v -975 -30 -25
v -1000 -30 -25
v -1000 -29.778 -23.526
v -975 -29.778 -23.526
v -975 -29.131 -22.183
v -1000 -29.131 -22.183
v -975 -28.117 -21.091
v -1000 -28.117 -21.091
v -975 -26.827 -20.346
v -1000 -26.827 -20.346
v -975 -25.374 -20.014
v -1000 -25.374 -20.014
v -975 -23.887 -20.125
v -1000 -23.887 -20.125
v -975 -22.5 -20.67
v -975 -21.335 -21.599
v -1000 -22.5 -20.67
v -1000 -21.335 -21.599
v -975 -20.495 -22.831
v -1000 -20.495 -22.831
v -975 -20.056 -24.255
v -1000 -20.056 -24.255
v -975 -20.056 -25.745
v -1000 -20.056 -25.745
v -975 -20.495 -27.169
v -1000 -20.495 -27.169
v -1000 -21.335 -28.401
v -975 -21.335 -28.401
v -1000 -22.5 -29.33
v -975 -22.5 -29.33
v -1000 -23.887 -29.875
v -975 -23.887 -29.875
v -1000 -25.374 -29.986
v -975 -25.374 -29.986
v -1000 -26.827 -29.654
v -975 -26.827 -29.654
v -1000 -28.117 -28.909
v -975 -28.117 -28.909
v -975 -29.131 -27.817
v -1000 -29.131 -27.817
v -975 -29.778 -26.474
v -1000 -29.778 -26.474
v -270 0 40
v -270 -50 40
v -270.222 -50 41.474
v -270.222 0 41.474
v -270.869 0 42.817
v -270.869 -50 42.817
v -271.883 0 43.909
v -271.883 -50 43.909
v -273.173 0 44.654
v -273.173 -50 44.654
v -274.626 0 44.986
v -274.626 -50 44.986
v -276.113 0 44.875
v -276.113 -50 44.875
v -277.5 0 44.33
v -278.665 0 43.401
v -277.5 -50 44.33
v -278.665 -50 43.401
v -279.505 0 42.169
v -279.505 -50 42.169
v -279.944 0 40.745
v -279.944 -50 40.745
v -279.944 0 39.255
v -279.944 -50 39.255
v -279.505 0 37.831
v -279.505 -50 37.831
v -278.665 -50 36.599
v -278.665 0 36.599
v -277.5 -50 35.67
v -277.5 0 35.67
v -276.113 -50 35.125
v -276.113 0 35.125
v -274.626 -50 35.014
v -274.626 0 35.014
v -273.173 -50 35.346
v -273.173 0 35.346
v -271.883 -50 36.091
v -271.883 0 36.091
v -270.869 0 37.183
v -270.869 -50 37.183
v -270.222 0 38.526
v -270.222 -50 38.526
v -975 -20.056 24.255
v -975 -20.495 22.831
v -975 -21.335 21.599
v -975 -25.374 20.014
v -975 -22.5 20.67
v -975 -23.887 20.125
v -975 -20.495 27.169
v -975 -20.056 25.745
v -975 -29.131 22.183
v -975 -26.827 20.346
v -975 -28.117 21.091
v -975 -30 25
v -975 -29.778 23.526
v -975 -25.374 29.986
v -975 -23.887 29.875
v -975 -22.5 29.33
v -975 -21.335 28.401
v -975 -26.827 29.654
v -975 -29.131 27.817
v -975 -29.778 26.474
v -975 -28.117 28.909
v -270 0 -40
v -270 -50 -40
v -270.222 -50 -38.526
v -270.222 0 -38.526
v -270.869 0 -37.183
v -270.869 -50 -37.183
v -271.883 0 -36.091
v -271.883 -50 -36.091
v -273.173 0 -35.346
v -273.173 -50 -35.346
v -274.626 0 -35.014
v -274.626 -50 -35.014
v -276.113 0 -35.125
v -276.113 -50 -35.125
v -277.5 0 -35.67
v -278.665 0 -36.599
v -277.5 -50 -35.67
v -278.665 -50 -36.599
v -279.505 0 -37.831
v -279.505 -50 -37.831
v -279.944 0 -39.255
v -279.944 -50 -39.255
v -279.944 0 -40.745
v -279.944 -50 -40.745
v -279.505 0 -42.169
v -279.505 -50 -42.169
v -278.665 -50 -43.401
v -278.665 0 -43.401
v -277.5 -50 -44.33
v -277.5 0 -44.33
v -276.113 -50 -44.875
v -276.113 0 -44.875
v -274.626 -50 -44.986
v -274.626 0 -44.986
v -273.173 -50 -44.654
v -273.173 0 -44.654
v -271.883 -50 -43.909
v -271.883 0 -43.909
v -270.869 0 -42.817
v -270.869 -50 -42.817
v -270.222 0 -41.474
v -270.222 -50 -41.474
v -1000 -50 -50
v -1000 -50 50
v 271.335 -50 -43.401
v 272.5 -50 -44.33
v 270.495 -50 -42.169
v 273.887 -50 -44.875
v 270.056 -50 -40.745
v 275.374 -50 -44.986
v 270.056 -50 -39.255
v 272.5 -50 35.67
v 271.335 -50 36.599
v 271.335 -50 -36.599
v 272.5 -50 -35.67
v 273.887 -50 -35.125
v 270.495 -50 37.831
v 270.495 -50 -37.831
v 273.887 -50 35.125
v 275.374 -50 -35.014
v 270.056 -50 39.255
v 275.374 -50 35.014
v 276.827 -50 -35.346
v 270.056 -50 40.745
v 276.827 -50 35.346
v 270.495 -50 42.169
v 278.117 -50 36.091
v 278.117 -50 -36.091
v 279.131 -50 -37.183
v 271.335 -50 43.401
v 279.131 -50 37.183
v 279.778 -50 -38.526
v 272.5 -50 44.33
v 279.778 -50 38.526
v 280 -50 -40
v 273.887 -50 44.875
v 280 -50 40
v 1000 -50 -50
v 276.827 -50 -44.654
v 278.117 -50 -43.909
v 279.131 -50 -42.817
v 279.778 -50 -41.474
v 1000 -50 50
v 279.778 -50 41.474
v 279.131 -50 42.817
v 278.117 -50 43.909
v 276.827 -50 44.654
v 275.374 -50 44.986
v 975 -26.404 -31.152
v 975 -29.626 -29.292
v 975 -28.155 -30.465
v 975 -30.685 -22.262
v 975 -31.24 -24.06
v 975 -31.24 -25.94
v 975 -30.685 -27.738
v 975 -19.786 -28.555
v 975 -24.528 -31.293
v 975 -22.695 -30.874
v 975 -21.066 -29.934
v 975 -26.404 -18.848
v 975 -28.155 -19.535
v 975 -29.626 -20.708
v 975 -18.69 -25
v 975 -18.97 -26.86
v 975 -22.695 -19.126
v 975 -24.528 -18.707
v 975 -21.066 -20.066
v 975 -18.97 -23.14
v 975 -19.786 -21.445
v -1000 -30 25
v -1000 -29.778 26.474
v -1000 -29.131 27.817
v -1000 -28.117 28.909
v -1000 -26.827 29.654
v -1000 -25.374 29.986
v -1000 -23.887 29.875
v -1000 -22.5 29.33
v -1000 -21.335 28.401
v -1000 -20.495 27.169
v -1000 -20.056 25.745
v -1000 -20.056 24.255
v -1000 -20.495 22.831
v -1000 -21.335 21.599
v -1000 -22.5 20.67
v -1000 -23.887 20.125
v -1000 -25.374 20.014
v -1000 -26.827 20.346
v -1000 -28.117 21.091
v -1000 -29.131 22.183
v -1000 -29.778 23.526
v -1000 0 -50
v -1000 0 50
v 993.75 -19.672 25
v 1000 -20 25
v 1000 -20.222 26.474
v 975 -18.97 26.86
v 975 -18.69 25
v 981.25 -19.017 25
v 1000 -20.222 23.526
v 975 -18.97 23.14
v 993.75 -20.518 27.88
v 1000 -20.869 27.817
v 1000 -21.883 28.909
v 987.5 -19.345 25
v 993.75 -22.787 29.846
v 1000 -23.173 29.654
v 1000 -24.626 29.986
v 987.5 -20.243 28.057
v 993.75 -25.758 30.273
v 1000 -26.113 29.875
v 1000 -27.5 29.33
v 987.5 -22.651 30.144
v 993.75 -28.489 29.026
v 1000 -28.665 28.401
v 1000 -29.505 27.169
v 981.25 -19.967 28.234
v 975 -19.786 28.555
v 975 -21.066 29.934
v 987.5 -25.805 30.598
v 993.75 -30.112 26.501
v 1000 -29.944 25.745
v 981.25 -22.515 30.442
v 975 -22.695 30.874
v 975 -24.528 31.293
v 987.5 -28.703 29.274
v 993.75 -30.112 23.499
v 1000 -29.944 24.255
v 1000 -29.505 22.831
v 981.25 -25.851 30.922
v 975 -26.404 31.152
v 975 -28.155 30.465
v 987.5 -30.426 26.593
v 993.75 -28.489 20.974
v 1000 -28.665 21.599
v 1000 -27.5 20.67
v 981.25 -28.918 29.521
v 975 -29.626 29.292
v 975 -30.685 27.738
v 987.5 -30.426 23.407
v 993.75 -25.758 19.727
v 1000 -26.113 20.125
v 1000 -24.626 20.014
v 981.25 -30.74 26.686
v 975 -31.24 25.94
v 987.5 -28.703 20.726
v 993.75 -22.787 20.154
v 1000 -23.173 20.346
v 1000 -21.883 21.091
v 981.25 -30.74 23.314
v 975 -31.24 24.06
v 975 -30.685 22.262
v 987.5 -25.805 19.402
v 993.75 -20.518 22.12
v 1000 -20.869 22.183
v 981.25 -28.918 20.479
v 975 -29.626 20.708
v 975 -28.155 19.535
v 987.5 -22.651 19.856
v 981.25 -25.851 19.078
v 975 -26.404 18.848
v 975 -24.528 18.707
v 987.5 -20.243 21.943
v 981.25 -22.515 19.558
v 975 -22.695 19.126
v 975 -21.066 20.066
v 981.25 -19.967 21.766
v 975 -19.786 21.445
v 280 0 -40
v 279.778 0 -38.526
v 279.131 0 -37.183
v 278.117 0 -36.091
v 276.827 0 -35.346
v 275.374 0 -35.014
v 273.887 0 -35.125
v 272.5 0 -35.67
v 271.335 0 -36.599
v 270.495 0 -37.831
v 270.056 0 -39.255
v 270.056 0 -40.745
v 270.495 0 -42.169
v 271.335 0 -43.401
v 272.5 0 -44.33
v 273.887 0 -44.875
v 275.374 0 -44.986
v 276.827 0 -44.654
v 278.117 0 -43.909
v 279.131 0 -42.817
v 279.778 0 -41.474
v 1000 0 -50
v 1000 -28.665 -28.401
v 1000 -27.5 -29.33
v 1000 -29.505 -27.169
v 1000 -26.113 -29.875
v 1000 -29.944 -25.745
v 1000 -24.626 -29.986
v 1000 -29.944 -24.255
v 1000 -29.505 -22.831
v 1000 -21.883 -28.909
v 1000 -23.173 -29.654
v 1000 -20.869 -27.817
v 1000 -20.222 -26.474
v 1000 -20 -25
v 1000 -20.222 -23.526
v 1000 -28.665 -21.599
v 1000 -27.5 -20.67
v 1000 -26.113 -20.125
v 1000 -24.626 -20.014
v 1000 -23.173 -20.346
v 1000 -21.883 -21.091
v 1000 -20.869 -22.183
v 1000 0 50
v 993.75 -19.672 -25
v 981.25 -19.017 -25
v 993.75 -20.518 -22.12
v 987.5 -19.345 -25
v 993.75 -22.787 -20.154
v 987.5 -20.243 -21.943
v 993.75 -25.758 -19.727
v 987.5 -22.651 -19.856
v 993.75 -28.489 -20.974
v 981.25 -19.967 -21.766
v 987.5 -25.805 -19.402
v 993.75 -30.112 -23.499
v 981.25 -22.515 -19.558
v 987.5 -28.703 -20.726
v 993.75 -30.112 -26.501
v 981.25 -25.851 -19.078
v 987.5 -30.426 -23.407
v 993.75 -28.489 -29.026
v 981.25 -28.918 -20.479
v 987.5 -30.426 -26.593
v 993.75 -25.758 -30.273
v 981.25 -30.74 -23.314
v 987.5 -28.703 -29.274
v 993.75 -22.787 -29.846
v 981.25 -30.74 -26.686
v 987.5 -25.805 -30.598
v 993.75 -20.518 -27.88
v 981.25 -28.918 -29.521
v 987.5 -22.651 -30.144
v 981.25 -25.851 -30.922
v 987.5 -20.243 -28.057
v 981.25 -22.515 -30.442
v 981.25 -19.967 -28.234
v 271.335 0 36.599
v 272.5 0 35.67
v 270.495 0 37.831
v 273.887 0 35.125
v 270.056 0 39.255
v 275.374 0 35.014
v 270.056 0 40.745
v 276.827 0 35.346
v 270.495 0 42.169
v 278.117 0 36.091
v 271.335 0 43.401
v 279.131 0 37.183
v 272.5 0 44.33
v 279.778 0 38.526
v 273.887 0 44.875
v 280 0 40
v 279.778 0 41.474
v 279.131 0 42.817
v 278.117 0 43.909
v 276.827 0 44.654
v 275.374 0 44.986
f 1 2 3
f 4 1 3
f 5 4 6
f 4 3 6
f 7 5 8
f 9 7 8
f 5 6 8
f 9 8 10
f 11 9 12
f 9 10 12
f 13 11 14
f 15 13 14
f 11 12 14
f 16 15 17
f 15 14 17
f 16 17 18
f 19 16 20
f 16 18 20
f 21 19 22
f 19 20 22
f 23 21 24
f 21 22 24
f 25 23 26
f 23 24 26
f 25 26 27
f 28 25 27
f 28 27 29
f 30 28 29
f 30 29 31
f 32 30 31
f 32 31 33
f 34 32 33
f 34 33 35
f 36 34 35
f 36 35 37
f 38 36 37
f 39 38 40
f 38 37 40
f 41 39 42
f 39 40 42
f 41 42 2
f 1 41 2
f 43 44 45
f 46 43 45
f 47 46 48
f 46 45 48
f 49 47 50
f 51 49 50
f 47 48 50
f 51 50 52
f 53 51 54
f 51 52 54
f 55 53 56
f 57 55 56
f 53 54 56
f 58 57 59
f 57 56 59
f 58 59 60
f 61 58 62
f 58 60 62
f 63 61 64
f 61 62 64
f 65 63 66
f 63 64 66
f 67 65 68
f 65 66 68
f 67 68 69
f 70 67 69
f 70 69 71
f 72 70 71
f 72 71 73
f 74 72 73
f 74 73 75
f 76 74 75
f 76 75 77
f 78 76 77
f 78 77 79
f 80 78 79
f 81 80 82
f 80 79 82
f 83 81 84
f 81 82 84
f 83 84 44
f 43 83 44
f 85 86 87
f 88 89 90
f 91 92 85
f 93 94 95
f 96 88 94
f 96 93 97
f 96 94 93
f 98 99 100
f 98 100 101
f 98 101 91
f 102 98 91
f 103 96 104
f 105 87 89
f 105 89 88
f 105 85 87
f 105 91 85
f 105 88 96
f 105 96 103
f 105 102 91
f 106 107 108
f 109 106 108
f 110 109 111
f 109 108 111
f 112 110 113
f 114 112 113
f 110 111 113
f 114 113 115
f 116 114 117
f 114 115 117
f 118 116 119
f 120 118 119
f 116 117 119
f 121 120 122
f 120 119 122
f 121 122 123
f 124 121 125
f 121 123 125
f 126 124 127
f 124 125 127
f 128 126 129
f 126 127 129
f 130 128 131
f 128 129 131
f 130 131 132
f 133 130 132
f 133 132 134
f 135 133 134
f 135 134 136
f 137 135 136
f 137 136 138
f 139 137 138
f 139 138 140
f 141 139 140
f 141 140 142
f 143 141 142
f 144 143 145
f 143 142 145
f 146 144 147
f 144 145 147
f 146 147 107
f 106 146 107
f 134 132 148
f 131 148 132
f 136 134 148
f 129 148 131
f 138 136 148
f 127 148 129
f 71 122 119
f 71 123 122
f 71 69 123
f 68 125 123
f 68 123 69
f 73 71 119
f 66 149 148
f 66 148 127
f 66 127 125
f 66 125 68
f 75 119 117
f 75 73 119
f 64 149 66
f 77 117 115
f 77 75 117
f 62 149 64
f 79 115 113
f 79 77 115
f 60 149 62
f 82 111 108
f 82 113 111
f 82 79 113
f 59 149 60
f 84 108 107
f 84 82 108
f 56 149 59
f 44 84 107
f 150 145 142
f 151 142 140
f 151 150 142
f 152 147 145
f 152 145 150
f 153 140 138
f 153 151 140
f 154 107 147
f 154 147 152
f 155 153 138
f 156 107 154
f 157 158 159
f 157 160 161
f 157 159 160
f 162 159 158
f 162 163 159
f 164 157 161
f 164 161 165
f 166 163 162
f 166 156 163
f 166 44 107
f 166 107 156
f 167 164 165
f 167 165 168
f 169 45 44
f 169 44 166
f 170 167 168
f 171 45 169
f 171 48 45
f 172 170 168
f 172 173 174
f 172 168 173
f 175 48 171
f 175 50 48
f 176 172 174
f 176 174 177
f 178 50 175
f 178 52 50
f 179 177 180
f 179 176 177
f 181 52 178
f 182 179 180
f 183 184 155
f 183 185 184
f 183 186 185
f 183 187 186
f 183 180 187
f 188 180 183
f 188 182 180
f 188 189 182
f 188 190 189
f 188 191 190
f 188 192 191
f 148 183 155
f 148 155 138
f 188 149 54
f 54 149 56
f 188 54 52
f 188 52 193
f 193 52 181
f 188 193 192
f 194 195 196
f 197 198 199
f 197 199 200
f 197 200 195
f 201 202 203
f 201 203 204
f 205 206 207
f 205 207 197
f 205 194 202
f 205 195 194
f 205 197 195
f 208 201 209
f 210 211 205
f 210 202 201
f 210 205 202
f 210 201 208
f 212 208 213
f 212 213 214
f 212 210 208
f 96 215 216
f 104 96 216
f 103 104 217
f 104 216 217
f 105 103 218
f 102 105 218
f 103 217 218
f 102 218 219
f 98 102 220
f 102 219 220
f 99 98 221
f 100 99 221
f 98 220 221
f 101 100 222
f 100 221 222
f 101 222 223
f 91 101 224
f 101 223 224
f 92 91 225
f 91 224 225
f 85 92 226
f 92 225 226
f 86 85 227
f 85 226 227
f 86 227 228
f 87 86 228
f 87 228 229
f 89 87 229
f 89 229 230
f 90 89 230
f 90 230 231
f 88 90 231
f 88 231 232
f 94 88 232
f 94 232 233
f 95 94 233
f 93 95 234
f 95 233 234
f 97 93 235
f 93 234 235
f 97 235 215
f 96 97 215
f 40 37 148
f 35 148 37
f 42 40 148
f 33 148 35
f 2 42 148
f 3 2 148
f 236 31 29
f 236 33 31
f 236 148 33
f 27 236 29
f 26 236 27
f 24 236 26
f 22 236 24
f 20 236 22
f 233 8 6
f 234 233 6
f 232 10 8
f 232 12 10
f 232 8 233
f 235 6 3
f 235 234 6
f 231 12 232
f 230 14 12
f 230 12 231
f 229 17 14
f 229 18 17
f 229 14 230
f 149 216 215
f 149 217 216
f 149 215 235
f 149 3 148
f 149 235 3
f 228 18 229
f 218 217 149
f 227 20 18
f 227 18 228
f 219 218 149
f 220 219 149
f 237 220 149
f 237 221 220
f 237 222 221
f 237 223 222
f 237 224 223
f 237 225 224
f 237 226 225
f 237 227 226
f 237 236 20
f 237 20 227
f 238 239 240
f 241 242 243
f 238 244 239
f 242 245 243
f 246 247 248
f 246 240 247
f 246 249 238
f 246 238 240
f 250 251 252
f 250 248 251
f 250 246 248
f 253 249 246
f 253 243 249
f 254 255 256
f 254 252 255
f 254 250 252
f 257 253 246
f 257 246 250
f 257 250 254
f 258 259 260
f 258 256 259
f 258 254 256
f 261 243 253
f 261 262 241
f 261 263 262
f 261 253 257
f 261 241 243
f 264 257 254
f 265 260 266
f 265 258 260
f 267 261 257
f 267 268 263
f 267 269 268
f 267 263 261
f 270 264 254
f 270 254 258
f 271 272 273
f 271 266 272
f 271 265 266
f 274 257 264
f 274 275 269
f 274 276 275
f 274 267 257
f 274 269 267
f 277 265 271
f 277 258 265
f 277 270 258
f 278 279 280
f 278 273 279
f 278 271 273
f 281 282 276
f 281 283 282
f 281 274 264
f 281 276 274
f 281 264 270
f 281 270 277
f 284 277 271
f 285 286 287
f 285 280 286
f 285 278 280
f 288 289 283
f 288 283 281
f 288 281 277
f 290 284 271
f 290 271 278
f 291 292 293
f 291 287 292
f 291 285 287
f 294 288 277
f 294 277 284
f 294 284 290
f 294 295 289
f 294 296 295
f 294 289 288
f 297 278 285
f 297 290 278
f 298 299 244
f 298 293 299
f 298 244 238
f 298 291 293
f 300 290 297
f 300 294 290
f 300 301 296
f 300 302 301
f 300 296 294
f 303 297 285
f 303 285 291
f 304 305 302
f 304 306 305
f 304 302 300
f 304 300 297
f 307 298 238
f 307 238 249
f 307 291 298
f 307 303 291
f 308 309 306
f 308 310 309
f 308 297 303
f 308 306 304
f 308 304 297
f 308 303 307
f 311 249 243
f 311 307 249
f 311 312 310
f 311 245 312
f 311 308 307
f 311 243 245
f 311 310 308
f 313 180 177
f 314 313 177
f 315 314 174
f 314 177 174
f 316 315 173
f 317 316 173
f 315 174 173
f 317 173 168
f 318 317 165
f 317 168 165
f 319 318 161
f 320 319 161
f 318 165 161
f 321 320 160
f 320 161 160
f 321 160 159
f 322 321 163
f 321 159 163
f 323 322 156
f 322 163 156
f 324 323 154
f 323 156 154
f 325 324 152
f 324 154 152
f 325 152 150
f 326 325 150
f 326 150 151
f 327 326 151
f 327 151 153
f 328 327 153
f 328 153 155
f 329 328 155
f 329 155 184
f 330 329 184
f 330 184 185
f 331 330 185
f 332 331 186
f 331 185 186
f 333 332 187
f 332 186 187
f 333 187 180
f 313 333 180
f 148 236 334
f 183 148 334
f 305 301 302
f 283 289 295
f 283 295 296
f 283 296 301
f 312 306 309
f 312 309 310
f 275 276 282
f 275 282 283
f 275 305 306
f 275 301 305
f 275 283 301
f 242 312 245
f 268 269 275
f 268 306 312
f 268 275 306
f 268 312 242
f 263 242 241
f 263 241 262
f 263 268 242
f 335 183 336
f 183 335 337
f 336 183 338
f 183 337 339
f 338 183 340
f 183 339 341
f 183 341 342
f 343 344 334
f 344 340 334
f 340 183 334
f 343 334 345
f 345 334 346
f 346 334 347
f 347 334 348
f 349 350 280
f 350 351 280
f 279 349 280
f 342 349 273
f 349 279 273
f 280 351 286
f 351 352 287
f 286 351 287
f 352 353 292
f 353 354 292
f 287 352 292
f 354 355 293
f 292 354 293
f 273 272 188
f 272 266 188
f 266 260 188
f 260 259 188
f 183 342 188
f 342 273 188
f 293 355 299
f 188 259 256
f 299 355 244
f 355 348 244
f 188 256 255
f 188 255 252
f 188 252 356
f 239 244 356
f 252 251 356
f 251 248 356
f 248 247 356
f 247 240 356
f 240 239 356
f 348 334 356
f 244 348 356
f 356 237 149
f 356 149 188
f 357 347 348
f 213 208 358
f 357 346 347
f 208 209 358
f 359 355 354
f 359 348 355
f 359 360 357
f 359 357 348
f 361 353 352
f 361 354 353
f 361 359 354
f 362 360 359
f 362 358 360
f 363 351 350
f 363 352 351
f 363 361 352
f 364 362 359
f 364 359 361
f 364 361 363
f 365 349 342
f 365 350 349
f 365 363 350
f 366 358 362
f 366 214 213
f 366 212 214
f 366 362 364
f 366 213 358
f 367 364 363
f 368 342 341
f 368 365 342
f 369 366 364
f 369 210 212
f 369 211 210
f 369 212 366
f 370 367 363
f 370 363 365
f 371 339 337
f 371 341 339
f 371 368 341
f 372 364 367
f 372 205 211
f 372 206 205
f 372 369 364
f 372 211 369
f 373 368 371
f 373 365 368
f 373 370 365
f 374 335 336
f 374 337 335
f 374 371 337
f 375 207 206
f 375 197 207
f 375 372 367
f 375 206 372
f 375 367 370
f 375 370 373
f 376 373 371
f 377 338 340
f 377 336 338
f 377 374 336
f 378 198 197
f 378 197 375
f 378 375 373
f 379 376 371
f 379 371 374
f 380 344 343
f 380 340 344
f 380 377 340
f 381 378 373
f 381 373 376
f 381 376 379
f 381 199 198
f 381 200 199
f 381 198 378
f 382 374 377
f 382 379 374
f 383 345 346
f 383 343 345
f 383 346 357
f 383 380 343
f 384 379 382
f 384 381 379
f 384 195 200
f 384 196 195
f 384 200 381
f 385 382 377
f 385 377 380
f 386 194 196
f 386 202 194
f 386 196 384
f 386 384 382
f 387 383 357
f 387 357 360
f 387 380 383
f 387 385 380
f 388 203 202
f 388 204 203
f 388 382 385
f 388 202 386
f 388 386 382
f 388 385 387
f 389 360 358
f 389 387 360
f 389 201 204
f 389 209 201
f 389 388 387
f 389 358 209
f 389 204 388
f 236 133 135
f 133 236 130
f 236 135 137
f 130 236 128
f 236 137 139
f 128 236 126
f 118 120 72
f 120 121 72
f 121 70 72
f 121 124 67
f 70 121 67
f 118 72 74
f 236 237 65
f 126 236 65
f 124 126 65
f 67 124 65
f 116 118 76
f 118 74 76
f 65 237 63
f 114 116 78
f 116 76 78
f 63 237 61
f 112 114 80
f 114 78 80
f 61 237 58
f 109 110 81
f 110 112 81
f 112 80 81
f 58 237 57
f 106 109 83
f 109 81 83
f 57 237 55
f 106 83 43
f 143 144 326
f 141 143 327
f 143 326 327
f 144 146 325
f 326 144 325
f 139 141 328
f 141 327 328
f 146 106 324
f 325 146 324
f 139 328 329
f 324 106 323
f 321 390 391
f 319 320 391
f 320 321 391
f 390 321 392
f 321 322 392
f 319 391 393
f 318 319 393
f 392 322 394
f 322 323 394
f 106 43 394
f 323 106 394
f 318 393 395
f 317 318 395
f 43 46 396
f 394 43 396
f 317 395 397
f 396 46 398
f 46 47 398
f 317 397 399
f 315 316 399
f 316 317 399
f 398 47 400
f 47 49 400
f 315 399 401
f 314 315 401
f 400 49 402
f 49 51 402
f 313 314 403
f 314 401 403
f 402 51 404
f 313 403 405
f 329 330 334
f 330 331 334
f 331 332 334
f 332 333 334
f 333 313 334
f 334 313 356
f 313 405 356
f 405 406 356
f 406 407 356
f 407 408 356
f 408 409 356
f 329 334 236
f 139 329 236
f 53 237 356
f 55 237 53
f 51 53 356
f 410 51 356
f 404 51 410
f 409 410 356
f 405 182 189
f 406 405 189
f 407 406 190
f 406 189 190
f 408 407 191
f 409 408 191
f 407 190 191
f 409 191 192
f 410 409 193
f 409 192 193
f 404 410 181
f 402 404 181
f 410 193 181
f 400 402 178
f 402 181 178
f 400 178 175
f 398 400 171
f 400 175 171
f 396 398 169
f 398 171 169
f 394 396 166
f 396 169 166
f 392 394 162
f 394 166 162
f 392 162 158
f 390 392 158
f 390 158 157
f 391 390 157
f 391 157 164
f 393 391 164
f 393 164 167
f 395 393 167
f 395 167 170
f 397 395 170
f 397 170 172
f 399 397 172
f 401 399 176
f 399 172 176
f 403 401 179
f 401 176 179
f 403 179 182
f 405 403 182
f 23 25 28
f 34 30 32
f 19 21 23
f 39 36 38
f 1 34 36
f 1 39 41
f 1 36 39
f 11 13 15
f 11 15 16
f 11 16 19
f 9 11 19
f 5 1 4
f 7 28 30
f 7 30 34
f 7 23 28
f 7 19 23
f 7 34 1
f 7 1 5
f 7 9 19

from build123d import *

# Parameters (mm, degrees)
F0_W     = 2000
F0_H     = 100
F1_DEPTH = 50
F3_R     = 5
F4_DEPTH = 25
F2_R     = 5
F5_DEPTH = 25
F5_TAPER = -3
F6_R     = 5
F7_DEPTH = 50


with BuildPart() as f1:
    # F0 (on Front) → F1 (new body)
    with BuildSketch(Plane.XZ):
        Rectangle(F0_W, F0_H)
    extrude(amount=F1_DEPTH)

    # F3 (on face) → F4 (cut)
    with BuildSketch(Plane(origin=(-1000, 0, 0), x_dir=(0, -1, 0), z_dir=(-1, 0, 0))):
        with Locations((25, 25)):
            Circle(F3_R)
        with Locations((25, -25)):
            Circle(F3_R)
    extrude(amount=-F4_DEPTH, mode=Mode.SUBTRACT)

    # F2 (on face) → F5 (cut)
    with BuildSketch(Plane.YZ.offset(1000)):
        with Locations((-25, -25)):
            Circle(F2_R)
        with Locations((-25, 25)):
            Circle(F2_R)
    extrude(amount=-F5_DEPTH, taper=F5_TAPER, mode=Mode.SUBTRACT)

    # F6 (on face) → F7 (cut)
    with BuildSketch(Plane.XZ.offset(50)):
        with Locations((-275, 40)):
            Circle(F6_R)
        with Locations((-275, -40)):
            Circle(F6_R)
        with Locations((275, 40)):
            Circle(F6_R)
        with Locations((275, -40)):
            Circle(F6_R)
    extrude(amount=-F7_DEPTH, mode=Mode.SUBTRACT)


solid = f1.part
